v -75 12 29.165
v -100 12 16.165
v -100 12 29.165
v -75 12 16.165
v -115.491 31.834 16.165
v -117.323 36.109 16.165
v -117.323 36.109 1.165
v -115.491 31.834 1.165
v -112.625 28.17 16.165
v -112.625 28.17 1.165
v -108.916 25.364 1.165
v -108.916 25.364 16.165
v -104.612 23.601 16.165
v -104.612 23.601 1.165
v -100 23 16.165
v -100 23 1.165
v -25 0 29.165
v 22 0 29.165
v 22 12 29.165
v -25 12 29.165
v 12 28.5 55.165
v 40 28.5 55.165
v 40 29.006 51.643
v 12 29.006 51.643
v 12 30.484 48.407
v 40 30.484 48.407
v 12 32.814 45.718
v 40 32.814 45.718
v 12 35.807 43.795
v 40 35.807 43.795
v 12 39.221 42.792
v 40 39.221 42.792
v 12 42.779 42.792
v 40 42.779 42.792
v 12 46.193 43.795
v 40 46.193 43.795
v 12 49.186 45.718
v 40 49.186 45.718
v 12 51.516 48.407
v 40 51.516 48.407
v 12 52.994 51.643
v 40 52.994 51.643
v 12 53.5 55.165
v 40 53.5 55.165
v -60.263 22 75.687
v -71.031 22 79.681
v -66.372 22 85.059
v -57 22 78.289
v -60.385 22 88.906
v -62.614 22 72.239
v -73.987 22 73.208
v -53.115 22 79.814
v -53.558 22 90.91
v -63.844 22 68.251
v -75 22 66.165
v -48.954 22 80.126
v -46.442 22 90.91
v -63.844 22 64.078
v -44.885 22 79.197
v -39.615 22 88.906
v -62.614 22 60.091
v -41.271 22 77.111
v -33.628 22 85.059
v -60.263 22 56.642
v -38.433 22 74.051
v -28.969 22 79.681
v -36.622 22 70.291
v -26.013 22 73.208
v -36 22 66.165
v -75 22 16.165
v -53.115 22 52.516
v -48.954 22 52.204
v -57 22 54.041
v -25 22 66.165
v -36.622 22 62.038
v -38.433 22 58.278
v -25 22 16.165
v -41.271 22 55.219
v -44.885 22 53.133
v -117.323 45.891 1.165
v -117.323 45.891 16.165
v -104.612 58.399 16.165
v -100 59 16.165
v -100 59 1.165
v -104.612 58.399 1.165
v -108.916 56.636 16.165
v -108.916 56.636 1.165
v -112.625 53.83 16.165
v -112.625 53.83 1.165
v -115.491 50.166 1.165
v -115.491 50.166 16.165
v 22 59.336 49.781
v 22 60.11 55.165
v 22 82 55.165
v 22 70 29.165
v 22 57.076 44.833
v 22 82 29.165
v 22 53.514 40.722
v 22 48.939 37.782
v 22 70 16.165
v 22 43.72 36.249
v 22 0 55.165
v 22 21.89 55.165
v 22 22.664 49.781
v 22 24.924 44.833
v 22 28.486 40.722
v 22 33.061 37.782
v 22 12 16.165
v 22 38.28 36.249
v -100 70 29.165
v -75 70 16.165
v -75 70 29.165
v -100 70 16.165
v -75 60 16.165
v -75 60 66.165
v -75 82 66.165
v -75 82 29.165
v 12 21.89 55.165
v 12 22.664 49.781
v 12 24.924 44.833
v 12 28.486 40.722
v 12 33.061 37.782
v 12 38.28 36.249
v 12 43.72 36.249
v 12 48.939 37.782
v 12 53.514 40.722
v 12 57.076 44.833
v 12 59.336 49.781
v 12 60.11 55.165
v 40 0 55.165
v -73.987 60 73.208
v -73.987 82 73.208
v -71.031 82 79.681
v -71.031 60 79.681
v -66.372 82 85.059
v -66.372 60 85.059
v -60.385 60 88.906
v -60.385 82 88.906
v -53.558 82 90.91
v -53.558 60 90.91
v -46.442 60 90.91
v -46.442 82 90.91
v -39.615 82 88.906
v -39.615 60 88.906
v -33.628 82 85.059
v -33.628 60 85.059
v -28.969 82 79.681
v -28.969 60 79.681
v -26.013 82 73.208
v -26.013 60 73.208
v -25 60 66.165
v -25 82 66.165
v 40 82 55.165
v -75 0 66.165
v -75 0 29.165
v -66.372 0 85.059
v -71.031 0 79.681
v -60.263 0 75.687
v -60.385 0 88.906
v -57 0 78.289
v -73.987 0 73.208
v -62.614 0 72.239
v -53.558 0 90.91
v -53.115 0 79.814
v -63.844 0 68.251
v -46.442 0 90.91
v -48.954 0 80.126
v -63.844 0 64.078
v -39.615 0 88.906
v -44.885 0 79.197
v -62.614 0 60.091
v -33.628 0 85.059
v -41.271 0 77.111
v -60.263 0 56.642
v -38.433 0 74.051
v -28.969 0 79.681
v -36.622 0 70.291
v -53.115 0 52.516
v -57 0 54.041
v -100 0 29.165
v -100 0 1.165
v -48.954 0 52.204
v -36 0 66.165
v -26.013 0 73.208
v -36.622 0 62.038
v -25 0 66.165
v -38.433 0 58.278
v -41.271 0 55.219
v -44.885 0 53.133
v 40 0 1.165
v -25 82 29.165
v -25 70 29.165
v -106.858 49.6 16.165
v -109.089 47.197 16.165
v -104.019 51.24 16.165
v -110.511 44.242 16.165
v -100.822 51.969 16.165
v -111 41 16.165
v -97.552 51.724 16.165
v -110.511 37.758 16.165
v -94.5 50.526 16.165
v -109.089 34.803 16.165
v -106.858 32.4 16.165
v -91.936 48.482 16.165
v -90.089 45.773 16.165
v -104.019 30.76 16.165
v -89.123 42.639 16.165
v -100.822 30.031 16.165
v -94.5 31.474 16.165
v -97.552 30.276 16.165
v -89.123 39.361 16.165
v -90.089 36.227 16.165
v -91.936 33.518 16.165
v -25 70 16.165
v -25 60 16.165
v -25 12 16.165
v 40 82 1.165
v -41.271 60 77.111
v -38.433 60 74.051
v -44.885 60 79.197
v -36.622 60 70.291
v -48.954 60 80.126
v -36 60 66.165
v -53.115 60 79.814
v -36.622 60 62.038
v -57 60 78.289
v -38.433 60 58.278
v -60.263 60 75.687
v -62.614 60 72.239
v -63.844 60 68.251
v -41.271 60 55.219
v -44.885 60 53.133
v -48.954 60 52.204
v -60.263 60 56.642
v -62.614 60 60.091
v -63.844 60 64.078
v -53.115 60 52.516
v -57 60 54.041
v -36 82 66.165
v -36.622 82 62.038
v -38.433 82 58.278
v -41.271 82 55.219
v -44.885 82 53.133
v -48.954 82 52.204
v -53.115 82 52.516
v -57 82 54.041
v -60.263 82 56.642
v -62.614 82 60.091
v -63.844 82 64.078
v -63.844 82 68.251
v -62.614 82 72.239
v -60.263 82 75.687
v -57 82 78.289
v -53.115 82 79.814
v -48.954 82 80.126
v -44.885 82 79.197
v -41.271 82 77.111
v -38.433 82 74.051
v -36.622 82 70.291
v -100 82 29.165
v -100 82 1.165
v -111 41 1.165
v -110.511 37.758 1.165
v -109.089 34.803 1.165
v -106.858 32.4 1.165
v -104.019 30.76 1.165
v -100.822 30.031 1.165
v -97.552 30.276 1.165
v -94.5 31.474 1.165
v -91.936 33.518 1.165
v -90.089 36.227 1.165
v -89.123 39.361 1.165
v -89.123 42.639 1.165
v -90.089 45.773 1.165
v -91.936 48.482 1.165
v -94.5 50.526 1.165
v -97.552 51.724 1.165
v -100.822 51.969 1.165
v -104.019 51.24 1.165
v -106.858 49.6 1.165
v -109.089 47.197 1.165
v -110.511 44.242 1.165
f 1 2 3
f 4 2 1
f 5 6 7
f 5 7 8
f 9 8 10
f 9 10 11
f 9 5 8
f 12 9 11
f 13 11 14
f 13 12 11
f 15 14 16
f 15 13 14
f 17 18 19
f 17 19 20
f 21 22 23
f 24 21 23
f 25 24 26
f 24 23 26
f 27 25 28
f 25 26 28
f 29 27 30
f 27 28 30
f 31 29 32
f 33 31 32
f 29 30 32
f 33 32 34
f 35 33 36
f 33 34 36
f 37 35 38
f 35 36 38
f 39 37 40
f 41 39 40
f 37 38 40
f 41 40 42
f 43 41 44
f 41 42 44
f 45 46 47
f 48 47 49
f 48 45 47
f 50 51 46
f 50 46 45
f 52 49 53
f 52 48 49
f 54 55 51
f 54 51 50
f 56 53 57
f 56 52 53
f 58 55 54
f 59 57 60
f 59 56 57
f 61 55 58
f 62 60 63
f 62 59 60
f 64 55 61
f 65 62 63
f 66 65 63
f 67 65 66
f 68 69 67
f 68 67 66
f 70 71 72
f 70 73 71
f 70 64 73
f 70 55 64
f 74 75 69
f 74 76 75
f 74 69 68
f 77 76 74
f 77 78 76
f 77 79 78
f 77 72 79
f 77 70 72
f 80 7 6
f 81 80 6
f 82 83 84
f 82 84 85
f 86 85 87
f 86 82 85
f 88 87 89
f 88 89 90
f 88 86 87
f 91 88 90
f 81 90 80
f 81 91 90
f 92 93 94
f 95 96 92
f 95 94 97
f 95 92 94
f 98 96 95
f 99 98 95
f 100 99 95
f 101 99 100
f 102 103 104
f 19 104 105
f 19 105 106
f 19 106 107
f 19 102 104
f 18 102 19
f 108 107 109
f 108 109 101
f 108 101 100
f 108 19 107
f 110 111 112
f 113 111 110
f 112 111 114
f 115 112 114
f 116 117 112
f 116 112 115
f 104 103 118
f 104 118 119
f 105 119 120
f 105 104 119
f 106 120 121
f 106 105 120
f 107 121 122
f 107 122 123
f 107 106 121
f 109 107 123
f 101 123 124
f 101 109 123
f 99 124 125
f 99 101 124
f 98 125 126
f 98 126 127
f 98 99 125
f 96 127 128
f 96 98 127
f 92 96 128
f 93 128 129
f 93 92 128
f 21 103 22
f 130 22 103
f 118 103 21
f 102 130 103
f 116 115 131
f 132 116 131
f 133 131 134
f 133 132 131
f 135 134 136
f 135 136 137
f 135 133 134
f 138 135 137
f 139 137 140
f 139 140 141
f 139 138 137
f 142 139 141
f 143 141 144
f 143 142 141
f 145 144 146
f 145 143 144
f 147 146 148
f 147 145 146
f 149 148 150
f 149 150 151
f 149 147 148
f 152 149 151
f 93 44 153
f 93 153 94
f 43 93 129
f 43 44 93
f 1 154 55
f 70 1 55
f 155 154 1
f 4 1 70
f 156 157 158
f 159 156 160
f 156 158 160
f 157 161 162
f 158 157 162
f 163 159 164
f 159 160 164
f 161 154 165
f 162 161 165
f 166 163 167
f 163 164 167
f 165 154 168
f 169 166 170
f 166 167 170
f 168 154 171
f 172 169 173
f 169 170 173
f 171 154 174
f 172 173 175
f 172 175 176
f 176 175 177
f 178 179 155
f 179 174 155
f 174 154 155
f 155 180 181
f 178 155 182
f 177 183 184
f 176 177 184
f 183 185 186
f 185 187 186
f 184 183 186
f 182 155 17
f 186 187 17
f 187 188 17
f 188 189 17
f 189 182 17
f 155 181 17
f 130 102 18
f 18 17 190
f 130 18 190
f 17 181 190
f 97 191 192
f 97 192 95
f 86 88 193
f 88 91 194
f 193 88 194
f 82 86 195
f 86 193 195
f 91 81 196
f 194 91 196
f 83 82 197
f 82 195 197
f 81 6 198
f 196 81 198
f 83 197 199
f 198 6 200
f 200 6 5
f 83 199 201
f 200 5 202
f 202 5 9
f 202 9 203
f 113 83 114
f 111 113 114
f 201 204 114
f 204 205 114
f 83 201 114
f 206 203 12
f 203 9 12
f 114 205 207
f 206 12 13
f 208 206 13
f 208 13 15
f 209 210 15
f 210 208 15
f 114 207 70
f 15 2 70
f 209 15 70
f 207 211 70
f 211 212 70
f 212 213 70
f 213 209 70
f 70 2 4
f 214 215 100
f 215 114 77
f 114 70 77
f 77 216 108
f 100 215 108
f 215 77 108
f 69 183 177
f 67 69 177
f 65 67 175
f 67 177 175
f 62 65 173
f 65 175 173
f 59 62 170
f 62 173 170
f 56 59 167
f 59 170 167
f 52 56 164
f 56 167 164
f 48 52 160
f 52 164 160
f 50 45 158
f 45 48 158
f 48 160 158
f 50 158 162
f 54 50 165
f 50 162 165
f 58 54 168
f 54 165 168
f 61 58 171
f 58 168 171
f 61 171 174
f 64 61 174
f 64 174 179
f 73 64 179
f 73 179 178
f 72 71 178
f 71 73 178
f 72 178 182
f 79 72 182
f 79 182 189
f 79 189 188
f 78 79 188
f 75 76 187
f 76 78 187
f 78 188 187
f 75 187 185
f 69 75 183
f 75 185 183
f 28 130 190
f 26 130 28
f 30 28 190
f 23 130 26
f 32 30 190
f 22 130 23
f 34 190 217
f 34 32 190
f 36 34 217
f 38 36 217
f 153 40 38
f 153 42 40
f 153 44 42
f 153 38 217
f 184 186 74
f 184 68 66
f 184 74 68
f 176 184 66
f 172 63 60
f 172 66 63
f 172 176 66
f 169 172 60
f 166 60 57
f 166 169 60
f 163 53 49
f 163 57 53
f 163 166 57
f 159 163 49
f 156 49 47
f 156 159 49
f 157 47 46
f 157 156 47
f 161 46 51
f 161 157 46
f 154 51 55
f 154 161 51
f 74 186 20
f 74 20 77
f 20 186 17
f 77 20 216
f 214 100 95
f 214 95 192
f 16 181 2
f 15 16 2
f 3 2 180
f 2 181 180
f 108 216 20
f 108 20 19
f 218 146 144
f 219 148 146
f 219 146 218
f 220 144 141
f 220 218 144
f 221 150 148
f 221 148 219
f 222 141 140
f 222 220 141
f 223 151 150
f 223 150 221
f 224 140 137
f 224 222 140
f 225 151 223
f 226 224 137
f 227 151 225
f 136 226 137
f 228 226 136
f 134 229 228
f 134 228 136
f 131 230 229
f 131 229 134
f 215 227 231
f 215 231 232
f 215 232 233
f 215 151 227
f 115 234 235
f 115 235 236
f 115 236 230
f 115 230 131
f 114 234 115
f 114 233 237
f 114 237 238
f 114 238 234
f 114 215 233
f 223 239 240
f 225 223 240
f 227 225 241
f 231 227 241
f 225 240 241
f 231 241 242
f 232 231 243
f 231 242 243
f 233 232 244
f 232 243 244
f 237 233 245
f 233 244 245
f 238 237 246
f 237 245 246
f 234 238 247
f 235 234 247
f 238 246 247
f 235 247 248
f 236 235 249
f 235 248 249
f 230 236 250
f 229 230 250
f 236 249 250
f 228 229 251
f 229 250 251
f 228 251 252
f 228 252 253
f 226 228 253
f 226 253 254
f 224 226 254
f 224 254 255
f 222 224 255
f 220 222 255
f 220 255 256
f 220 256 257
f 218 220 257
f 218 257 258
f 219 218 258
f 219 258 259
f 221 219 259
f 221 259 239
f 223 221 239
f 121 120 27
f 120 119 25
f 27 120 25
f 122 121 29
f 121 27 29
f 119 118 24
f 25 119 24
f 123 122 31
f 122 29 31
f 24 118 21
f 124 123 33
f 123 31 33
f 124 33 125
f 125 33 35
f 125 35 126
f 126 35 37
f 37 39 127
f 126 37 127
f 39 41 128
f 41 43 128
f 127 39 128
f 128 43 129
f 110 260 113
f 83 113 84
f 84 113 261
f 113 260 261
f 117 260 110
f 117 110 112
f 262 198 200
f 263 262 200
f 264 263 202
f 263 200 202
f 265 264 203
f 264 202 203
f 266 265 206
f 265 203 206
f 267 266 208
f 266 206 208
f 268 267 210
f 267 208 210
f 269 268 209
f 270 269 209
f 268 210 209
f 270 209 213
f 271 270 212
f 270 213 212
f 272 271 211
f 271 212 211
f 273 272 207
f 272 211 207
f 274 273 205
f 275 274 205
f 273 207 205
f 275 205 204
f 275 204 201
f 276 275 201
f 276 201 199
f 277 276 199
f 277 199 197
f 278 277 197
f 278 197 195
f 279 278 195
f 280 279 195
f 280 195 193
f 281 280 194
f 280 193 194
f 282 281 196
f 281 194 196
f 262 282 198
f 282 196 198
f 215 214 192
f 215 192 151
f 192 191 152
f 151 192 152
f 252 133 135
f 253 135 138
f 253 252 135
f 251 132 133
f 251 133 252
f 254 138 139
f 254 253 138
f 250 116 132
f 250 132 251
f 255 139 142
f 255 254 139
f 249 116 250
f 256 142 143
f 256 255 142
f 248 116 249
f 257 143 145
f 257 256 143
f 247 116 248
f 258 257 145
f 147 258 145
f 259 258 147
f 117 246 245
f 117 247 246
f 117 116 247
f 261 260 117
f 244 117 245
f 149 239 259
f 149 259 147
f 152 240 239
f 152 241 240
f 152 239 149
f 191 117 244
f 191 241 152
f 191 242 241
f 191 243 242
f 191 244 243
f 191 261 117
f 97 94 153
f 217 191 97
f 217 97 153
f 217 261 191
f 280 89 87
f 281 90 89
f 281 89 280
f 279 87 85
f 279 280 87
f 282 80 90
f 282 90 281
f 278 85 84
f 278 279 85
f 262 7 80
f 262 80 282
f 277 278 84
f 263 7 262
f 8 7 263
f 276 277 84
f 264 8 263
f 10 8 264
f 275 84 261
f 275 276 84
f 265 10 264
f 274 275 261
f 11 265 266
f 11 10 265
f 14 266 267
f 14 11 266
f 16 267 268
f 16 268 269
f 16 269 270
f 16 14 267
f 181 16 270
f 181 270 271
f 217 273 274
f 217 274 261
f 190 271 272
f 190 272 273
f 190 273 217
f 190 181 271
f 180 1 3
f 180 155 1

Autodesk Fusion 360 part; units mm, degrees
sketch "Sketch1" plane through (0, 0, 0) normal (0, 1, 0) x (1, 0, 0)
  line L0 (-100, -1.1649) -> (40, -1.1649)
  line L1 (40, -1.1649) -> (40, -55.1649)
  line L2 (40, -55.1649) -> (22, -55.1649)
  line L3 (-100, -1.1649) -> (-100, -29.1649)
  line L4 (22, -55.1649) -> (22, -29.1649)
  circle A0 centre (-50, -66.1649) radius 25
  circle A1 centre (-50, -66.1649) radius 14
  line L5 (-25, -66.1649) -> (-25, -29.1649)
  line L6 (-75, -66.1649) -> (-75, -29.1649)
  line L7 (22, -29.1649) -> (-25, -29.1649)
  line L8 (-75, -29.1649) -> (-100, -29.1649)
  line L9 (22, -29.1649) -> (40, -29.1649)
  line L10 (-100, -1.1649) -> (-117.3228, -1.1649)
  line L11 (-117.3228, -1.1649) -> (-117.3228, -16.1649)
  line L12 (-117.3228, -16.1649) -> (-100, -16.1649)
  line L13 (-100, -16.1649) -> (40, -16.1649)
  line L14 (-75, -29.1649) -> (-75, -1.1649)
  line L15 (-25, -29.1649) -> (-25, -1.1649)
  line L16 (22, -29.1649) -> (22, -1.1649)
  dimension "d1" = 140
  dimension "d2" = 54
  dimension "d3" = 18
  dimension "d6" = 28
  dimension "d7" = 50
  dimension "d8" = 28
  dimension "d9" = 65
  dimension "d10" = 90
  dimension "d11" = 15
extrude "Extrude1" add sketch "Sketch1" along normal blind 82 contours L0 L3 L13 L14 | L3 L10 L11 L12 | L0 L13 L14 L15 | L0 L13 L15 L16 | L0 L1 L13 L16 | L1 L9 L13 L16 | L1 L2 L4 L9
extrude "Extrude2" add sketch "Sketch1" along normal blind 12 contours L3 L8 L13 L14 | L7 L13 L15 L16
extrude "Extrude3" add sketch "Sketch1" along normal blind 22 contours A0 L5 L6 L13 L14 L15 | A0
ref_plane "WorkPlane1" through (-38.6614, 41, 28.1649) normal (0, 1, 0) x (0, 0, 1)
mirror "Mirror1" about plane through (-38.6614, 41, 28.1649) normal (0, 1, 0) of "Extrude3"
mirror "Mirror2" about plane through (-38.6614, 41, 28.1649) normal (0, 1, 0) of "Extrude2"
sketch "Sketch2" plane through (40, 0, 0) normal (1, 0, 0) x (0, 1, 0)
  line L0 (0, 55.1649) -> (0, 1.1649)
  line L1 (0, 1.1649) -> (82, 1.1649)
  line L2 (82, 1.1649) -> (82, 55.1649)
  line L3 (82, 55.1649) -> (0, 55.1649)
  arc A0 (28.5, 55.1649) -> (53.5, 55.1649) centre (41, 55.1649) ccw
  arc A1 (21.8899, 55.1649) -> (60.1101, 55.1649) centre (41, 55.1649) ccw
  dimension "d22" = 25
extrude "Extrude4" add sketch "Sketch2" against normal blind 28 contours L3 A0 A1
extrude "Extrude5" cut sketch "Sketch2" against normal blind 28 contours L3 A0
sketch "Sketch3" plane through (0, 0, 16.1649) normal (0, 0, 1) x (-1, 0, 0)
  line L0 (-22, -70) -> (25, -70)
  line L1 (25, -70) -> (25, -60)
  line L2 (25, -60) -> (75, -60)
  line L3 (75, -60) -> (75, -70)
  line L4 (75, -70) -> (100, -70)
  line L5 (100, -70) -> (100, -82)
  line L6 (100, -82) -> (117.3228, -82)
  line L7 (117.3228, -82) -> (117.3228, 0)
  line L8 (117.3228, 0) -> (100, 0)
  line L9 (100, 0) -> (100, -12)
  line L10 (100, -12) -> (75, -12)
  line L11 (75, -12) -> (75, -22)
  line L12 (75, -22) -> (25, -22)
  line L13 (25, -22) -> (25, -12)
  line L14 (25, -12) -> (-22, -12)
  line L15 (-22, -12) -> (-22, -70)
  line L16 (100, -12) -> (100, -70) construction
  line L17 (117.3228, -41) -> (75, -41) construction
  circle A0 centre (100, -41) radius 11
  circle A1 centre (100, -41) radius 18
  line L18 (100, -12) -> (100, -70)
  dimension "d27" = 22
  dimension "d28" = 36
extrude "Extrude6" cut sketch "Sketch3" against normal blind 30 contours L5 L6 L7 A1 L18 | L7 L8 L9 A1 L18
extrude "Extrude7" cut sketch "Sketch3" against normal blind 25 contours A0 L18 | A0 L18
equation "d28 = 18 mm + 18 mm"
